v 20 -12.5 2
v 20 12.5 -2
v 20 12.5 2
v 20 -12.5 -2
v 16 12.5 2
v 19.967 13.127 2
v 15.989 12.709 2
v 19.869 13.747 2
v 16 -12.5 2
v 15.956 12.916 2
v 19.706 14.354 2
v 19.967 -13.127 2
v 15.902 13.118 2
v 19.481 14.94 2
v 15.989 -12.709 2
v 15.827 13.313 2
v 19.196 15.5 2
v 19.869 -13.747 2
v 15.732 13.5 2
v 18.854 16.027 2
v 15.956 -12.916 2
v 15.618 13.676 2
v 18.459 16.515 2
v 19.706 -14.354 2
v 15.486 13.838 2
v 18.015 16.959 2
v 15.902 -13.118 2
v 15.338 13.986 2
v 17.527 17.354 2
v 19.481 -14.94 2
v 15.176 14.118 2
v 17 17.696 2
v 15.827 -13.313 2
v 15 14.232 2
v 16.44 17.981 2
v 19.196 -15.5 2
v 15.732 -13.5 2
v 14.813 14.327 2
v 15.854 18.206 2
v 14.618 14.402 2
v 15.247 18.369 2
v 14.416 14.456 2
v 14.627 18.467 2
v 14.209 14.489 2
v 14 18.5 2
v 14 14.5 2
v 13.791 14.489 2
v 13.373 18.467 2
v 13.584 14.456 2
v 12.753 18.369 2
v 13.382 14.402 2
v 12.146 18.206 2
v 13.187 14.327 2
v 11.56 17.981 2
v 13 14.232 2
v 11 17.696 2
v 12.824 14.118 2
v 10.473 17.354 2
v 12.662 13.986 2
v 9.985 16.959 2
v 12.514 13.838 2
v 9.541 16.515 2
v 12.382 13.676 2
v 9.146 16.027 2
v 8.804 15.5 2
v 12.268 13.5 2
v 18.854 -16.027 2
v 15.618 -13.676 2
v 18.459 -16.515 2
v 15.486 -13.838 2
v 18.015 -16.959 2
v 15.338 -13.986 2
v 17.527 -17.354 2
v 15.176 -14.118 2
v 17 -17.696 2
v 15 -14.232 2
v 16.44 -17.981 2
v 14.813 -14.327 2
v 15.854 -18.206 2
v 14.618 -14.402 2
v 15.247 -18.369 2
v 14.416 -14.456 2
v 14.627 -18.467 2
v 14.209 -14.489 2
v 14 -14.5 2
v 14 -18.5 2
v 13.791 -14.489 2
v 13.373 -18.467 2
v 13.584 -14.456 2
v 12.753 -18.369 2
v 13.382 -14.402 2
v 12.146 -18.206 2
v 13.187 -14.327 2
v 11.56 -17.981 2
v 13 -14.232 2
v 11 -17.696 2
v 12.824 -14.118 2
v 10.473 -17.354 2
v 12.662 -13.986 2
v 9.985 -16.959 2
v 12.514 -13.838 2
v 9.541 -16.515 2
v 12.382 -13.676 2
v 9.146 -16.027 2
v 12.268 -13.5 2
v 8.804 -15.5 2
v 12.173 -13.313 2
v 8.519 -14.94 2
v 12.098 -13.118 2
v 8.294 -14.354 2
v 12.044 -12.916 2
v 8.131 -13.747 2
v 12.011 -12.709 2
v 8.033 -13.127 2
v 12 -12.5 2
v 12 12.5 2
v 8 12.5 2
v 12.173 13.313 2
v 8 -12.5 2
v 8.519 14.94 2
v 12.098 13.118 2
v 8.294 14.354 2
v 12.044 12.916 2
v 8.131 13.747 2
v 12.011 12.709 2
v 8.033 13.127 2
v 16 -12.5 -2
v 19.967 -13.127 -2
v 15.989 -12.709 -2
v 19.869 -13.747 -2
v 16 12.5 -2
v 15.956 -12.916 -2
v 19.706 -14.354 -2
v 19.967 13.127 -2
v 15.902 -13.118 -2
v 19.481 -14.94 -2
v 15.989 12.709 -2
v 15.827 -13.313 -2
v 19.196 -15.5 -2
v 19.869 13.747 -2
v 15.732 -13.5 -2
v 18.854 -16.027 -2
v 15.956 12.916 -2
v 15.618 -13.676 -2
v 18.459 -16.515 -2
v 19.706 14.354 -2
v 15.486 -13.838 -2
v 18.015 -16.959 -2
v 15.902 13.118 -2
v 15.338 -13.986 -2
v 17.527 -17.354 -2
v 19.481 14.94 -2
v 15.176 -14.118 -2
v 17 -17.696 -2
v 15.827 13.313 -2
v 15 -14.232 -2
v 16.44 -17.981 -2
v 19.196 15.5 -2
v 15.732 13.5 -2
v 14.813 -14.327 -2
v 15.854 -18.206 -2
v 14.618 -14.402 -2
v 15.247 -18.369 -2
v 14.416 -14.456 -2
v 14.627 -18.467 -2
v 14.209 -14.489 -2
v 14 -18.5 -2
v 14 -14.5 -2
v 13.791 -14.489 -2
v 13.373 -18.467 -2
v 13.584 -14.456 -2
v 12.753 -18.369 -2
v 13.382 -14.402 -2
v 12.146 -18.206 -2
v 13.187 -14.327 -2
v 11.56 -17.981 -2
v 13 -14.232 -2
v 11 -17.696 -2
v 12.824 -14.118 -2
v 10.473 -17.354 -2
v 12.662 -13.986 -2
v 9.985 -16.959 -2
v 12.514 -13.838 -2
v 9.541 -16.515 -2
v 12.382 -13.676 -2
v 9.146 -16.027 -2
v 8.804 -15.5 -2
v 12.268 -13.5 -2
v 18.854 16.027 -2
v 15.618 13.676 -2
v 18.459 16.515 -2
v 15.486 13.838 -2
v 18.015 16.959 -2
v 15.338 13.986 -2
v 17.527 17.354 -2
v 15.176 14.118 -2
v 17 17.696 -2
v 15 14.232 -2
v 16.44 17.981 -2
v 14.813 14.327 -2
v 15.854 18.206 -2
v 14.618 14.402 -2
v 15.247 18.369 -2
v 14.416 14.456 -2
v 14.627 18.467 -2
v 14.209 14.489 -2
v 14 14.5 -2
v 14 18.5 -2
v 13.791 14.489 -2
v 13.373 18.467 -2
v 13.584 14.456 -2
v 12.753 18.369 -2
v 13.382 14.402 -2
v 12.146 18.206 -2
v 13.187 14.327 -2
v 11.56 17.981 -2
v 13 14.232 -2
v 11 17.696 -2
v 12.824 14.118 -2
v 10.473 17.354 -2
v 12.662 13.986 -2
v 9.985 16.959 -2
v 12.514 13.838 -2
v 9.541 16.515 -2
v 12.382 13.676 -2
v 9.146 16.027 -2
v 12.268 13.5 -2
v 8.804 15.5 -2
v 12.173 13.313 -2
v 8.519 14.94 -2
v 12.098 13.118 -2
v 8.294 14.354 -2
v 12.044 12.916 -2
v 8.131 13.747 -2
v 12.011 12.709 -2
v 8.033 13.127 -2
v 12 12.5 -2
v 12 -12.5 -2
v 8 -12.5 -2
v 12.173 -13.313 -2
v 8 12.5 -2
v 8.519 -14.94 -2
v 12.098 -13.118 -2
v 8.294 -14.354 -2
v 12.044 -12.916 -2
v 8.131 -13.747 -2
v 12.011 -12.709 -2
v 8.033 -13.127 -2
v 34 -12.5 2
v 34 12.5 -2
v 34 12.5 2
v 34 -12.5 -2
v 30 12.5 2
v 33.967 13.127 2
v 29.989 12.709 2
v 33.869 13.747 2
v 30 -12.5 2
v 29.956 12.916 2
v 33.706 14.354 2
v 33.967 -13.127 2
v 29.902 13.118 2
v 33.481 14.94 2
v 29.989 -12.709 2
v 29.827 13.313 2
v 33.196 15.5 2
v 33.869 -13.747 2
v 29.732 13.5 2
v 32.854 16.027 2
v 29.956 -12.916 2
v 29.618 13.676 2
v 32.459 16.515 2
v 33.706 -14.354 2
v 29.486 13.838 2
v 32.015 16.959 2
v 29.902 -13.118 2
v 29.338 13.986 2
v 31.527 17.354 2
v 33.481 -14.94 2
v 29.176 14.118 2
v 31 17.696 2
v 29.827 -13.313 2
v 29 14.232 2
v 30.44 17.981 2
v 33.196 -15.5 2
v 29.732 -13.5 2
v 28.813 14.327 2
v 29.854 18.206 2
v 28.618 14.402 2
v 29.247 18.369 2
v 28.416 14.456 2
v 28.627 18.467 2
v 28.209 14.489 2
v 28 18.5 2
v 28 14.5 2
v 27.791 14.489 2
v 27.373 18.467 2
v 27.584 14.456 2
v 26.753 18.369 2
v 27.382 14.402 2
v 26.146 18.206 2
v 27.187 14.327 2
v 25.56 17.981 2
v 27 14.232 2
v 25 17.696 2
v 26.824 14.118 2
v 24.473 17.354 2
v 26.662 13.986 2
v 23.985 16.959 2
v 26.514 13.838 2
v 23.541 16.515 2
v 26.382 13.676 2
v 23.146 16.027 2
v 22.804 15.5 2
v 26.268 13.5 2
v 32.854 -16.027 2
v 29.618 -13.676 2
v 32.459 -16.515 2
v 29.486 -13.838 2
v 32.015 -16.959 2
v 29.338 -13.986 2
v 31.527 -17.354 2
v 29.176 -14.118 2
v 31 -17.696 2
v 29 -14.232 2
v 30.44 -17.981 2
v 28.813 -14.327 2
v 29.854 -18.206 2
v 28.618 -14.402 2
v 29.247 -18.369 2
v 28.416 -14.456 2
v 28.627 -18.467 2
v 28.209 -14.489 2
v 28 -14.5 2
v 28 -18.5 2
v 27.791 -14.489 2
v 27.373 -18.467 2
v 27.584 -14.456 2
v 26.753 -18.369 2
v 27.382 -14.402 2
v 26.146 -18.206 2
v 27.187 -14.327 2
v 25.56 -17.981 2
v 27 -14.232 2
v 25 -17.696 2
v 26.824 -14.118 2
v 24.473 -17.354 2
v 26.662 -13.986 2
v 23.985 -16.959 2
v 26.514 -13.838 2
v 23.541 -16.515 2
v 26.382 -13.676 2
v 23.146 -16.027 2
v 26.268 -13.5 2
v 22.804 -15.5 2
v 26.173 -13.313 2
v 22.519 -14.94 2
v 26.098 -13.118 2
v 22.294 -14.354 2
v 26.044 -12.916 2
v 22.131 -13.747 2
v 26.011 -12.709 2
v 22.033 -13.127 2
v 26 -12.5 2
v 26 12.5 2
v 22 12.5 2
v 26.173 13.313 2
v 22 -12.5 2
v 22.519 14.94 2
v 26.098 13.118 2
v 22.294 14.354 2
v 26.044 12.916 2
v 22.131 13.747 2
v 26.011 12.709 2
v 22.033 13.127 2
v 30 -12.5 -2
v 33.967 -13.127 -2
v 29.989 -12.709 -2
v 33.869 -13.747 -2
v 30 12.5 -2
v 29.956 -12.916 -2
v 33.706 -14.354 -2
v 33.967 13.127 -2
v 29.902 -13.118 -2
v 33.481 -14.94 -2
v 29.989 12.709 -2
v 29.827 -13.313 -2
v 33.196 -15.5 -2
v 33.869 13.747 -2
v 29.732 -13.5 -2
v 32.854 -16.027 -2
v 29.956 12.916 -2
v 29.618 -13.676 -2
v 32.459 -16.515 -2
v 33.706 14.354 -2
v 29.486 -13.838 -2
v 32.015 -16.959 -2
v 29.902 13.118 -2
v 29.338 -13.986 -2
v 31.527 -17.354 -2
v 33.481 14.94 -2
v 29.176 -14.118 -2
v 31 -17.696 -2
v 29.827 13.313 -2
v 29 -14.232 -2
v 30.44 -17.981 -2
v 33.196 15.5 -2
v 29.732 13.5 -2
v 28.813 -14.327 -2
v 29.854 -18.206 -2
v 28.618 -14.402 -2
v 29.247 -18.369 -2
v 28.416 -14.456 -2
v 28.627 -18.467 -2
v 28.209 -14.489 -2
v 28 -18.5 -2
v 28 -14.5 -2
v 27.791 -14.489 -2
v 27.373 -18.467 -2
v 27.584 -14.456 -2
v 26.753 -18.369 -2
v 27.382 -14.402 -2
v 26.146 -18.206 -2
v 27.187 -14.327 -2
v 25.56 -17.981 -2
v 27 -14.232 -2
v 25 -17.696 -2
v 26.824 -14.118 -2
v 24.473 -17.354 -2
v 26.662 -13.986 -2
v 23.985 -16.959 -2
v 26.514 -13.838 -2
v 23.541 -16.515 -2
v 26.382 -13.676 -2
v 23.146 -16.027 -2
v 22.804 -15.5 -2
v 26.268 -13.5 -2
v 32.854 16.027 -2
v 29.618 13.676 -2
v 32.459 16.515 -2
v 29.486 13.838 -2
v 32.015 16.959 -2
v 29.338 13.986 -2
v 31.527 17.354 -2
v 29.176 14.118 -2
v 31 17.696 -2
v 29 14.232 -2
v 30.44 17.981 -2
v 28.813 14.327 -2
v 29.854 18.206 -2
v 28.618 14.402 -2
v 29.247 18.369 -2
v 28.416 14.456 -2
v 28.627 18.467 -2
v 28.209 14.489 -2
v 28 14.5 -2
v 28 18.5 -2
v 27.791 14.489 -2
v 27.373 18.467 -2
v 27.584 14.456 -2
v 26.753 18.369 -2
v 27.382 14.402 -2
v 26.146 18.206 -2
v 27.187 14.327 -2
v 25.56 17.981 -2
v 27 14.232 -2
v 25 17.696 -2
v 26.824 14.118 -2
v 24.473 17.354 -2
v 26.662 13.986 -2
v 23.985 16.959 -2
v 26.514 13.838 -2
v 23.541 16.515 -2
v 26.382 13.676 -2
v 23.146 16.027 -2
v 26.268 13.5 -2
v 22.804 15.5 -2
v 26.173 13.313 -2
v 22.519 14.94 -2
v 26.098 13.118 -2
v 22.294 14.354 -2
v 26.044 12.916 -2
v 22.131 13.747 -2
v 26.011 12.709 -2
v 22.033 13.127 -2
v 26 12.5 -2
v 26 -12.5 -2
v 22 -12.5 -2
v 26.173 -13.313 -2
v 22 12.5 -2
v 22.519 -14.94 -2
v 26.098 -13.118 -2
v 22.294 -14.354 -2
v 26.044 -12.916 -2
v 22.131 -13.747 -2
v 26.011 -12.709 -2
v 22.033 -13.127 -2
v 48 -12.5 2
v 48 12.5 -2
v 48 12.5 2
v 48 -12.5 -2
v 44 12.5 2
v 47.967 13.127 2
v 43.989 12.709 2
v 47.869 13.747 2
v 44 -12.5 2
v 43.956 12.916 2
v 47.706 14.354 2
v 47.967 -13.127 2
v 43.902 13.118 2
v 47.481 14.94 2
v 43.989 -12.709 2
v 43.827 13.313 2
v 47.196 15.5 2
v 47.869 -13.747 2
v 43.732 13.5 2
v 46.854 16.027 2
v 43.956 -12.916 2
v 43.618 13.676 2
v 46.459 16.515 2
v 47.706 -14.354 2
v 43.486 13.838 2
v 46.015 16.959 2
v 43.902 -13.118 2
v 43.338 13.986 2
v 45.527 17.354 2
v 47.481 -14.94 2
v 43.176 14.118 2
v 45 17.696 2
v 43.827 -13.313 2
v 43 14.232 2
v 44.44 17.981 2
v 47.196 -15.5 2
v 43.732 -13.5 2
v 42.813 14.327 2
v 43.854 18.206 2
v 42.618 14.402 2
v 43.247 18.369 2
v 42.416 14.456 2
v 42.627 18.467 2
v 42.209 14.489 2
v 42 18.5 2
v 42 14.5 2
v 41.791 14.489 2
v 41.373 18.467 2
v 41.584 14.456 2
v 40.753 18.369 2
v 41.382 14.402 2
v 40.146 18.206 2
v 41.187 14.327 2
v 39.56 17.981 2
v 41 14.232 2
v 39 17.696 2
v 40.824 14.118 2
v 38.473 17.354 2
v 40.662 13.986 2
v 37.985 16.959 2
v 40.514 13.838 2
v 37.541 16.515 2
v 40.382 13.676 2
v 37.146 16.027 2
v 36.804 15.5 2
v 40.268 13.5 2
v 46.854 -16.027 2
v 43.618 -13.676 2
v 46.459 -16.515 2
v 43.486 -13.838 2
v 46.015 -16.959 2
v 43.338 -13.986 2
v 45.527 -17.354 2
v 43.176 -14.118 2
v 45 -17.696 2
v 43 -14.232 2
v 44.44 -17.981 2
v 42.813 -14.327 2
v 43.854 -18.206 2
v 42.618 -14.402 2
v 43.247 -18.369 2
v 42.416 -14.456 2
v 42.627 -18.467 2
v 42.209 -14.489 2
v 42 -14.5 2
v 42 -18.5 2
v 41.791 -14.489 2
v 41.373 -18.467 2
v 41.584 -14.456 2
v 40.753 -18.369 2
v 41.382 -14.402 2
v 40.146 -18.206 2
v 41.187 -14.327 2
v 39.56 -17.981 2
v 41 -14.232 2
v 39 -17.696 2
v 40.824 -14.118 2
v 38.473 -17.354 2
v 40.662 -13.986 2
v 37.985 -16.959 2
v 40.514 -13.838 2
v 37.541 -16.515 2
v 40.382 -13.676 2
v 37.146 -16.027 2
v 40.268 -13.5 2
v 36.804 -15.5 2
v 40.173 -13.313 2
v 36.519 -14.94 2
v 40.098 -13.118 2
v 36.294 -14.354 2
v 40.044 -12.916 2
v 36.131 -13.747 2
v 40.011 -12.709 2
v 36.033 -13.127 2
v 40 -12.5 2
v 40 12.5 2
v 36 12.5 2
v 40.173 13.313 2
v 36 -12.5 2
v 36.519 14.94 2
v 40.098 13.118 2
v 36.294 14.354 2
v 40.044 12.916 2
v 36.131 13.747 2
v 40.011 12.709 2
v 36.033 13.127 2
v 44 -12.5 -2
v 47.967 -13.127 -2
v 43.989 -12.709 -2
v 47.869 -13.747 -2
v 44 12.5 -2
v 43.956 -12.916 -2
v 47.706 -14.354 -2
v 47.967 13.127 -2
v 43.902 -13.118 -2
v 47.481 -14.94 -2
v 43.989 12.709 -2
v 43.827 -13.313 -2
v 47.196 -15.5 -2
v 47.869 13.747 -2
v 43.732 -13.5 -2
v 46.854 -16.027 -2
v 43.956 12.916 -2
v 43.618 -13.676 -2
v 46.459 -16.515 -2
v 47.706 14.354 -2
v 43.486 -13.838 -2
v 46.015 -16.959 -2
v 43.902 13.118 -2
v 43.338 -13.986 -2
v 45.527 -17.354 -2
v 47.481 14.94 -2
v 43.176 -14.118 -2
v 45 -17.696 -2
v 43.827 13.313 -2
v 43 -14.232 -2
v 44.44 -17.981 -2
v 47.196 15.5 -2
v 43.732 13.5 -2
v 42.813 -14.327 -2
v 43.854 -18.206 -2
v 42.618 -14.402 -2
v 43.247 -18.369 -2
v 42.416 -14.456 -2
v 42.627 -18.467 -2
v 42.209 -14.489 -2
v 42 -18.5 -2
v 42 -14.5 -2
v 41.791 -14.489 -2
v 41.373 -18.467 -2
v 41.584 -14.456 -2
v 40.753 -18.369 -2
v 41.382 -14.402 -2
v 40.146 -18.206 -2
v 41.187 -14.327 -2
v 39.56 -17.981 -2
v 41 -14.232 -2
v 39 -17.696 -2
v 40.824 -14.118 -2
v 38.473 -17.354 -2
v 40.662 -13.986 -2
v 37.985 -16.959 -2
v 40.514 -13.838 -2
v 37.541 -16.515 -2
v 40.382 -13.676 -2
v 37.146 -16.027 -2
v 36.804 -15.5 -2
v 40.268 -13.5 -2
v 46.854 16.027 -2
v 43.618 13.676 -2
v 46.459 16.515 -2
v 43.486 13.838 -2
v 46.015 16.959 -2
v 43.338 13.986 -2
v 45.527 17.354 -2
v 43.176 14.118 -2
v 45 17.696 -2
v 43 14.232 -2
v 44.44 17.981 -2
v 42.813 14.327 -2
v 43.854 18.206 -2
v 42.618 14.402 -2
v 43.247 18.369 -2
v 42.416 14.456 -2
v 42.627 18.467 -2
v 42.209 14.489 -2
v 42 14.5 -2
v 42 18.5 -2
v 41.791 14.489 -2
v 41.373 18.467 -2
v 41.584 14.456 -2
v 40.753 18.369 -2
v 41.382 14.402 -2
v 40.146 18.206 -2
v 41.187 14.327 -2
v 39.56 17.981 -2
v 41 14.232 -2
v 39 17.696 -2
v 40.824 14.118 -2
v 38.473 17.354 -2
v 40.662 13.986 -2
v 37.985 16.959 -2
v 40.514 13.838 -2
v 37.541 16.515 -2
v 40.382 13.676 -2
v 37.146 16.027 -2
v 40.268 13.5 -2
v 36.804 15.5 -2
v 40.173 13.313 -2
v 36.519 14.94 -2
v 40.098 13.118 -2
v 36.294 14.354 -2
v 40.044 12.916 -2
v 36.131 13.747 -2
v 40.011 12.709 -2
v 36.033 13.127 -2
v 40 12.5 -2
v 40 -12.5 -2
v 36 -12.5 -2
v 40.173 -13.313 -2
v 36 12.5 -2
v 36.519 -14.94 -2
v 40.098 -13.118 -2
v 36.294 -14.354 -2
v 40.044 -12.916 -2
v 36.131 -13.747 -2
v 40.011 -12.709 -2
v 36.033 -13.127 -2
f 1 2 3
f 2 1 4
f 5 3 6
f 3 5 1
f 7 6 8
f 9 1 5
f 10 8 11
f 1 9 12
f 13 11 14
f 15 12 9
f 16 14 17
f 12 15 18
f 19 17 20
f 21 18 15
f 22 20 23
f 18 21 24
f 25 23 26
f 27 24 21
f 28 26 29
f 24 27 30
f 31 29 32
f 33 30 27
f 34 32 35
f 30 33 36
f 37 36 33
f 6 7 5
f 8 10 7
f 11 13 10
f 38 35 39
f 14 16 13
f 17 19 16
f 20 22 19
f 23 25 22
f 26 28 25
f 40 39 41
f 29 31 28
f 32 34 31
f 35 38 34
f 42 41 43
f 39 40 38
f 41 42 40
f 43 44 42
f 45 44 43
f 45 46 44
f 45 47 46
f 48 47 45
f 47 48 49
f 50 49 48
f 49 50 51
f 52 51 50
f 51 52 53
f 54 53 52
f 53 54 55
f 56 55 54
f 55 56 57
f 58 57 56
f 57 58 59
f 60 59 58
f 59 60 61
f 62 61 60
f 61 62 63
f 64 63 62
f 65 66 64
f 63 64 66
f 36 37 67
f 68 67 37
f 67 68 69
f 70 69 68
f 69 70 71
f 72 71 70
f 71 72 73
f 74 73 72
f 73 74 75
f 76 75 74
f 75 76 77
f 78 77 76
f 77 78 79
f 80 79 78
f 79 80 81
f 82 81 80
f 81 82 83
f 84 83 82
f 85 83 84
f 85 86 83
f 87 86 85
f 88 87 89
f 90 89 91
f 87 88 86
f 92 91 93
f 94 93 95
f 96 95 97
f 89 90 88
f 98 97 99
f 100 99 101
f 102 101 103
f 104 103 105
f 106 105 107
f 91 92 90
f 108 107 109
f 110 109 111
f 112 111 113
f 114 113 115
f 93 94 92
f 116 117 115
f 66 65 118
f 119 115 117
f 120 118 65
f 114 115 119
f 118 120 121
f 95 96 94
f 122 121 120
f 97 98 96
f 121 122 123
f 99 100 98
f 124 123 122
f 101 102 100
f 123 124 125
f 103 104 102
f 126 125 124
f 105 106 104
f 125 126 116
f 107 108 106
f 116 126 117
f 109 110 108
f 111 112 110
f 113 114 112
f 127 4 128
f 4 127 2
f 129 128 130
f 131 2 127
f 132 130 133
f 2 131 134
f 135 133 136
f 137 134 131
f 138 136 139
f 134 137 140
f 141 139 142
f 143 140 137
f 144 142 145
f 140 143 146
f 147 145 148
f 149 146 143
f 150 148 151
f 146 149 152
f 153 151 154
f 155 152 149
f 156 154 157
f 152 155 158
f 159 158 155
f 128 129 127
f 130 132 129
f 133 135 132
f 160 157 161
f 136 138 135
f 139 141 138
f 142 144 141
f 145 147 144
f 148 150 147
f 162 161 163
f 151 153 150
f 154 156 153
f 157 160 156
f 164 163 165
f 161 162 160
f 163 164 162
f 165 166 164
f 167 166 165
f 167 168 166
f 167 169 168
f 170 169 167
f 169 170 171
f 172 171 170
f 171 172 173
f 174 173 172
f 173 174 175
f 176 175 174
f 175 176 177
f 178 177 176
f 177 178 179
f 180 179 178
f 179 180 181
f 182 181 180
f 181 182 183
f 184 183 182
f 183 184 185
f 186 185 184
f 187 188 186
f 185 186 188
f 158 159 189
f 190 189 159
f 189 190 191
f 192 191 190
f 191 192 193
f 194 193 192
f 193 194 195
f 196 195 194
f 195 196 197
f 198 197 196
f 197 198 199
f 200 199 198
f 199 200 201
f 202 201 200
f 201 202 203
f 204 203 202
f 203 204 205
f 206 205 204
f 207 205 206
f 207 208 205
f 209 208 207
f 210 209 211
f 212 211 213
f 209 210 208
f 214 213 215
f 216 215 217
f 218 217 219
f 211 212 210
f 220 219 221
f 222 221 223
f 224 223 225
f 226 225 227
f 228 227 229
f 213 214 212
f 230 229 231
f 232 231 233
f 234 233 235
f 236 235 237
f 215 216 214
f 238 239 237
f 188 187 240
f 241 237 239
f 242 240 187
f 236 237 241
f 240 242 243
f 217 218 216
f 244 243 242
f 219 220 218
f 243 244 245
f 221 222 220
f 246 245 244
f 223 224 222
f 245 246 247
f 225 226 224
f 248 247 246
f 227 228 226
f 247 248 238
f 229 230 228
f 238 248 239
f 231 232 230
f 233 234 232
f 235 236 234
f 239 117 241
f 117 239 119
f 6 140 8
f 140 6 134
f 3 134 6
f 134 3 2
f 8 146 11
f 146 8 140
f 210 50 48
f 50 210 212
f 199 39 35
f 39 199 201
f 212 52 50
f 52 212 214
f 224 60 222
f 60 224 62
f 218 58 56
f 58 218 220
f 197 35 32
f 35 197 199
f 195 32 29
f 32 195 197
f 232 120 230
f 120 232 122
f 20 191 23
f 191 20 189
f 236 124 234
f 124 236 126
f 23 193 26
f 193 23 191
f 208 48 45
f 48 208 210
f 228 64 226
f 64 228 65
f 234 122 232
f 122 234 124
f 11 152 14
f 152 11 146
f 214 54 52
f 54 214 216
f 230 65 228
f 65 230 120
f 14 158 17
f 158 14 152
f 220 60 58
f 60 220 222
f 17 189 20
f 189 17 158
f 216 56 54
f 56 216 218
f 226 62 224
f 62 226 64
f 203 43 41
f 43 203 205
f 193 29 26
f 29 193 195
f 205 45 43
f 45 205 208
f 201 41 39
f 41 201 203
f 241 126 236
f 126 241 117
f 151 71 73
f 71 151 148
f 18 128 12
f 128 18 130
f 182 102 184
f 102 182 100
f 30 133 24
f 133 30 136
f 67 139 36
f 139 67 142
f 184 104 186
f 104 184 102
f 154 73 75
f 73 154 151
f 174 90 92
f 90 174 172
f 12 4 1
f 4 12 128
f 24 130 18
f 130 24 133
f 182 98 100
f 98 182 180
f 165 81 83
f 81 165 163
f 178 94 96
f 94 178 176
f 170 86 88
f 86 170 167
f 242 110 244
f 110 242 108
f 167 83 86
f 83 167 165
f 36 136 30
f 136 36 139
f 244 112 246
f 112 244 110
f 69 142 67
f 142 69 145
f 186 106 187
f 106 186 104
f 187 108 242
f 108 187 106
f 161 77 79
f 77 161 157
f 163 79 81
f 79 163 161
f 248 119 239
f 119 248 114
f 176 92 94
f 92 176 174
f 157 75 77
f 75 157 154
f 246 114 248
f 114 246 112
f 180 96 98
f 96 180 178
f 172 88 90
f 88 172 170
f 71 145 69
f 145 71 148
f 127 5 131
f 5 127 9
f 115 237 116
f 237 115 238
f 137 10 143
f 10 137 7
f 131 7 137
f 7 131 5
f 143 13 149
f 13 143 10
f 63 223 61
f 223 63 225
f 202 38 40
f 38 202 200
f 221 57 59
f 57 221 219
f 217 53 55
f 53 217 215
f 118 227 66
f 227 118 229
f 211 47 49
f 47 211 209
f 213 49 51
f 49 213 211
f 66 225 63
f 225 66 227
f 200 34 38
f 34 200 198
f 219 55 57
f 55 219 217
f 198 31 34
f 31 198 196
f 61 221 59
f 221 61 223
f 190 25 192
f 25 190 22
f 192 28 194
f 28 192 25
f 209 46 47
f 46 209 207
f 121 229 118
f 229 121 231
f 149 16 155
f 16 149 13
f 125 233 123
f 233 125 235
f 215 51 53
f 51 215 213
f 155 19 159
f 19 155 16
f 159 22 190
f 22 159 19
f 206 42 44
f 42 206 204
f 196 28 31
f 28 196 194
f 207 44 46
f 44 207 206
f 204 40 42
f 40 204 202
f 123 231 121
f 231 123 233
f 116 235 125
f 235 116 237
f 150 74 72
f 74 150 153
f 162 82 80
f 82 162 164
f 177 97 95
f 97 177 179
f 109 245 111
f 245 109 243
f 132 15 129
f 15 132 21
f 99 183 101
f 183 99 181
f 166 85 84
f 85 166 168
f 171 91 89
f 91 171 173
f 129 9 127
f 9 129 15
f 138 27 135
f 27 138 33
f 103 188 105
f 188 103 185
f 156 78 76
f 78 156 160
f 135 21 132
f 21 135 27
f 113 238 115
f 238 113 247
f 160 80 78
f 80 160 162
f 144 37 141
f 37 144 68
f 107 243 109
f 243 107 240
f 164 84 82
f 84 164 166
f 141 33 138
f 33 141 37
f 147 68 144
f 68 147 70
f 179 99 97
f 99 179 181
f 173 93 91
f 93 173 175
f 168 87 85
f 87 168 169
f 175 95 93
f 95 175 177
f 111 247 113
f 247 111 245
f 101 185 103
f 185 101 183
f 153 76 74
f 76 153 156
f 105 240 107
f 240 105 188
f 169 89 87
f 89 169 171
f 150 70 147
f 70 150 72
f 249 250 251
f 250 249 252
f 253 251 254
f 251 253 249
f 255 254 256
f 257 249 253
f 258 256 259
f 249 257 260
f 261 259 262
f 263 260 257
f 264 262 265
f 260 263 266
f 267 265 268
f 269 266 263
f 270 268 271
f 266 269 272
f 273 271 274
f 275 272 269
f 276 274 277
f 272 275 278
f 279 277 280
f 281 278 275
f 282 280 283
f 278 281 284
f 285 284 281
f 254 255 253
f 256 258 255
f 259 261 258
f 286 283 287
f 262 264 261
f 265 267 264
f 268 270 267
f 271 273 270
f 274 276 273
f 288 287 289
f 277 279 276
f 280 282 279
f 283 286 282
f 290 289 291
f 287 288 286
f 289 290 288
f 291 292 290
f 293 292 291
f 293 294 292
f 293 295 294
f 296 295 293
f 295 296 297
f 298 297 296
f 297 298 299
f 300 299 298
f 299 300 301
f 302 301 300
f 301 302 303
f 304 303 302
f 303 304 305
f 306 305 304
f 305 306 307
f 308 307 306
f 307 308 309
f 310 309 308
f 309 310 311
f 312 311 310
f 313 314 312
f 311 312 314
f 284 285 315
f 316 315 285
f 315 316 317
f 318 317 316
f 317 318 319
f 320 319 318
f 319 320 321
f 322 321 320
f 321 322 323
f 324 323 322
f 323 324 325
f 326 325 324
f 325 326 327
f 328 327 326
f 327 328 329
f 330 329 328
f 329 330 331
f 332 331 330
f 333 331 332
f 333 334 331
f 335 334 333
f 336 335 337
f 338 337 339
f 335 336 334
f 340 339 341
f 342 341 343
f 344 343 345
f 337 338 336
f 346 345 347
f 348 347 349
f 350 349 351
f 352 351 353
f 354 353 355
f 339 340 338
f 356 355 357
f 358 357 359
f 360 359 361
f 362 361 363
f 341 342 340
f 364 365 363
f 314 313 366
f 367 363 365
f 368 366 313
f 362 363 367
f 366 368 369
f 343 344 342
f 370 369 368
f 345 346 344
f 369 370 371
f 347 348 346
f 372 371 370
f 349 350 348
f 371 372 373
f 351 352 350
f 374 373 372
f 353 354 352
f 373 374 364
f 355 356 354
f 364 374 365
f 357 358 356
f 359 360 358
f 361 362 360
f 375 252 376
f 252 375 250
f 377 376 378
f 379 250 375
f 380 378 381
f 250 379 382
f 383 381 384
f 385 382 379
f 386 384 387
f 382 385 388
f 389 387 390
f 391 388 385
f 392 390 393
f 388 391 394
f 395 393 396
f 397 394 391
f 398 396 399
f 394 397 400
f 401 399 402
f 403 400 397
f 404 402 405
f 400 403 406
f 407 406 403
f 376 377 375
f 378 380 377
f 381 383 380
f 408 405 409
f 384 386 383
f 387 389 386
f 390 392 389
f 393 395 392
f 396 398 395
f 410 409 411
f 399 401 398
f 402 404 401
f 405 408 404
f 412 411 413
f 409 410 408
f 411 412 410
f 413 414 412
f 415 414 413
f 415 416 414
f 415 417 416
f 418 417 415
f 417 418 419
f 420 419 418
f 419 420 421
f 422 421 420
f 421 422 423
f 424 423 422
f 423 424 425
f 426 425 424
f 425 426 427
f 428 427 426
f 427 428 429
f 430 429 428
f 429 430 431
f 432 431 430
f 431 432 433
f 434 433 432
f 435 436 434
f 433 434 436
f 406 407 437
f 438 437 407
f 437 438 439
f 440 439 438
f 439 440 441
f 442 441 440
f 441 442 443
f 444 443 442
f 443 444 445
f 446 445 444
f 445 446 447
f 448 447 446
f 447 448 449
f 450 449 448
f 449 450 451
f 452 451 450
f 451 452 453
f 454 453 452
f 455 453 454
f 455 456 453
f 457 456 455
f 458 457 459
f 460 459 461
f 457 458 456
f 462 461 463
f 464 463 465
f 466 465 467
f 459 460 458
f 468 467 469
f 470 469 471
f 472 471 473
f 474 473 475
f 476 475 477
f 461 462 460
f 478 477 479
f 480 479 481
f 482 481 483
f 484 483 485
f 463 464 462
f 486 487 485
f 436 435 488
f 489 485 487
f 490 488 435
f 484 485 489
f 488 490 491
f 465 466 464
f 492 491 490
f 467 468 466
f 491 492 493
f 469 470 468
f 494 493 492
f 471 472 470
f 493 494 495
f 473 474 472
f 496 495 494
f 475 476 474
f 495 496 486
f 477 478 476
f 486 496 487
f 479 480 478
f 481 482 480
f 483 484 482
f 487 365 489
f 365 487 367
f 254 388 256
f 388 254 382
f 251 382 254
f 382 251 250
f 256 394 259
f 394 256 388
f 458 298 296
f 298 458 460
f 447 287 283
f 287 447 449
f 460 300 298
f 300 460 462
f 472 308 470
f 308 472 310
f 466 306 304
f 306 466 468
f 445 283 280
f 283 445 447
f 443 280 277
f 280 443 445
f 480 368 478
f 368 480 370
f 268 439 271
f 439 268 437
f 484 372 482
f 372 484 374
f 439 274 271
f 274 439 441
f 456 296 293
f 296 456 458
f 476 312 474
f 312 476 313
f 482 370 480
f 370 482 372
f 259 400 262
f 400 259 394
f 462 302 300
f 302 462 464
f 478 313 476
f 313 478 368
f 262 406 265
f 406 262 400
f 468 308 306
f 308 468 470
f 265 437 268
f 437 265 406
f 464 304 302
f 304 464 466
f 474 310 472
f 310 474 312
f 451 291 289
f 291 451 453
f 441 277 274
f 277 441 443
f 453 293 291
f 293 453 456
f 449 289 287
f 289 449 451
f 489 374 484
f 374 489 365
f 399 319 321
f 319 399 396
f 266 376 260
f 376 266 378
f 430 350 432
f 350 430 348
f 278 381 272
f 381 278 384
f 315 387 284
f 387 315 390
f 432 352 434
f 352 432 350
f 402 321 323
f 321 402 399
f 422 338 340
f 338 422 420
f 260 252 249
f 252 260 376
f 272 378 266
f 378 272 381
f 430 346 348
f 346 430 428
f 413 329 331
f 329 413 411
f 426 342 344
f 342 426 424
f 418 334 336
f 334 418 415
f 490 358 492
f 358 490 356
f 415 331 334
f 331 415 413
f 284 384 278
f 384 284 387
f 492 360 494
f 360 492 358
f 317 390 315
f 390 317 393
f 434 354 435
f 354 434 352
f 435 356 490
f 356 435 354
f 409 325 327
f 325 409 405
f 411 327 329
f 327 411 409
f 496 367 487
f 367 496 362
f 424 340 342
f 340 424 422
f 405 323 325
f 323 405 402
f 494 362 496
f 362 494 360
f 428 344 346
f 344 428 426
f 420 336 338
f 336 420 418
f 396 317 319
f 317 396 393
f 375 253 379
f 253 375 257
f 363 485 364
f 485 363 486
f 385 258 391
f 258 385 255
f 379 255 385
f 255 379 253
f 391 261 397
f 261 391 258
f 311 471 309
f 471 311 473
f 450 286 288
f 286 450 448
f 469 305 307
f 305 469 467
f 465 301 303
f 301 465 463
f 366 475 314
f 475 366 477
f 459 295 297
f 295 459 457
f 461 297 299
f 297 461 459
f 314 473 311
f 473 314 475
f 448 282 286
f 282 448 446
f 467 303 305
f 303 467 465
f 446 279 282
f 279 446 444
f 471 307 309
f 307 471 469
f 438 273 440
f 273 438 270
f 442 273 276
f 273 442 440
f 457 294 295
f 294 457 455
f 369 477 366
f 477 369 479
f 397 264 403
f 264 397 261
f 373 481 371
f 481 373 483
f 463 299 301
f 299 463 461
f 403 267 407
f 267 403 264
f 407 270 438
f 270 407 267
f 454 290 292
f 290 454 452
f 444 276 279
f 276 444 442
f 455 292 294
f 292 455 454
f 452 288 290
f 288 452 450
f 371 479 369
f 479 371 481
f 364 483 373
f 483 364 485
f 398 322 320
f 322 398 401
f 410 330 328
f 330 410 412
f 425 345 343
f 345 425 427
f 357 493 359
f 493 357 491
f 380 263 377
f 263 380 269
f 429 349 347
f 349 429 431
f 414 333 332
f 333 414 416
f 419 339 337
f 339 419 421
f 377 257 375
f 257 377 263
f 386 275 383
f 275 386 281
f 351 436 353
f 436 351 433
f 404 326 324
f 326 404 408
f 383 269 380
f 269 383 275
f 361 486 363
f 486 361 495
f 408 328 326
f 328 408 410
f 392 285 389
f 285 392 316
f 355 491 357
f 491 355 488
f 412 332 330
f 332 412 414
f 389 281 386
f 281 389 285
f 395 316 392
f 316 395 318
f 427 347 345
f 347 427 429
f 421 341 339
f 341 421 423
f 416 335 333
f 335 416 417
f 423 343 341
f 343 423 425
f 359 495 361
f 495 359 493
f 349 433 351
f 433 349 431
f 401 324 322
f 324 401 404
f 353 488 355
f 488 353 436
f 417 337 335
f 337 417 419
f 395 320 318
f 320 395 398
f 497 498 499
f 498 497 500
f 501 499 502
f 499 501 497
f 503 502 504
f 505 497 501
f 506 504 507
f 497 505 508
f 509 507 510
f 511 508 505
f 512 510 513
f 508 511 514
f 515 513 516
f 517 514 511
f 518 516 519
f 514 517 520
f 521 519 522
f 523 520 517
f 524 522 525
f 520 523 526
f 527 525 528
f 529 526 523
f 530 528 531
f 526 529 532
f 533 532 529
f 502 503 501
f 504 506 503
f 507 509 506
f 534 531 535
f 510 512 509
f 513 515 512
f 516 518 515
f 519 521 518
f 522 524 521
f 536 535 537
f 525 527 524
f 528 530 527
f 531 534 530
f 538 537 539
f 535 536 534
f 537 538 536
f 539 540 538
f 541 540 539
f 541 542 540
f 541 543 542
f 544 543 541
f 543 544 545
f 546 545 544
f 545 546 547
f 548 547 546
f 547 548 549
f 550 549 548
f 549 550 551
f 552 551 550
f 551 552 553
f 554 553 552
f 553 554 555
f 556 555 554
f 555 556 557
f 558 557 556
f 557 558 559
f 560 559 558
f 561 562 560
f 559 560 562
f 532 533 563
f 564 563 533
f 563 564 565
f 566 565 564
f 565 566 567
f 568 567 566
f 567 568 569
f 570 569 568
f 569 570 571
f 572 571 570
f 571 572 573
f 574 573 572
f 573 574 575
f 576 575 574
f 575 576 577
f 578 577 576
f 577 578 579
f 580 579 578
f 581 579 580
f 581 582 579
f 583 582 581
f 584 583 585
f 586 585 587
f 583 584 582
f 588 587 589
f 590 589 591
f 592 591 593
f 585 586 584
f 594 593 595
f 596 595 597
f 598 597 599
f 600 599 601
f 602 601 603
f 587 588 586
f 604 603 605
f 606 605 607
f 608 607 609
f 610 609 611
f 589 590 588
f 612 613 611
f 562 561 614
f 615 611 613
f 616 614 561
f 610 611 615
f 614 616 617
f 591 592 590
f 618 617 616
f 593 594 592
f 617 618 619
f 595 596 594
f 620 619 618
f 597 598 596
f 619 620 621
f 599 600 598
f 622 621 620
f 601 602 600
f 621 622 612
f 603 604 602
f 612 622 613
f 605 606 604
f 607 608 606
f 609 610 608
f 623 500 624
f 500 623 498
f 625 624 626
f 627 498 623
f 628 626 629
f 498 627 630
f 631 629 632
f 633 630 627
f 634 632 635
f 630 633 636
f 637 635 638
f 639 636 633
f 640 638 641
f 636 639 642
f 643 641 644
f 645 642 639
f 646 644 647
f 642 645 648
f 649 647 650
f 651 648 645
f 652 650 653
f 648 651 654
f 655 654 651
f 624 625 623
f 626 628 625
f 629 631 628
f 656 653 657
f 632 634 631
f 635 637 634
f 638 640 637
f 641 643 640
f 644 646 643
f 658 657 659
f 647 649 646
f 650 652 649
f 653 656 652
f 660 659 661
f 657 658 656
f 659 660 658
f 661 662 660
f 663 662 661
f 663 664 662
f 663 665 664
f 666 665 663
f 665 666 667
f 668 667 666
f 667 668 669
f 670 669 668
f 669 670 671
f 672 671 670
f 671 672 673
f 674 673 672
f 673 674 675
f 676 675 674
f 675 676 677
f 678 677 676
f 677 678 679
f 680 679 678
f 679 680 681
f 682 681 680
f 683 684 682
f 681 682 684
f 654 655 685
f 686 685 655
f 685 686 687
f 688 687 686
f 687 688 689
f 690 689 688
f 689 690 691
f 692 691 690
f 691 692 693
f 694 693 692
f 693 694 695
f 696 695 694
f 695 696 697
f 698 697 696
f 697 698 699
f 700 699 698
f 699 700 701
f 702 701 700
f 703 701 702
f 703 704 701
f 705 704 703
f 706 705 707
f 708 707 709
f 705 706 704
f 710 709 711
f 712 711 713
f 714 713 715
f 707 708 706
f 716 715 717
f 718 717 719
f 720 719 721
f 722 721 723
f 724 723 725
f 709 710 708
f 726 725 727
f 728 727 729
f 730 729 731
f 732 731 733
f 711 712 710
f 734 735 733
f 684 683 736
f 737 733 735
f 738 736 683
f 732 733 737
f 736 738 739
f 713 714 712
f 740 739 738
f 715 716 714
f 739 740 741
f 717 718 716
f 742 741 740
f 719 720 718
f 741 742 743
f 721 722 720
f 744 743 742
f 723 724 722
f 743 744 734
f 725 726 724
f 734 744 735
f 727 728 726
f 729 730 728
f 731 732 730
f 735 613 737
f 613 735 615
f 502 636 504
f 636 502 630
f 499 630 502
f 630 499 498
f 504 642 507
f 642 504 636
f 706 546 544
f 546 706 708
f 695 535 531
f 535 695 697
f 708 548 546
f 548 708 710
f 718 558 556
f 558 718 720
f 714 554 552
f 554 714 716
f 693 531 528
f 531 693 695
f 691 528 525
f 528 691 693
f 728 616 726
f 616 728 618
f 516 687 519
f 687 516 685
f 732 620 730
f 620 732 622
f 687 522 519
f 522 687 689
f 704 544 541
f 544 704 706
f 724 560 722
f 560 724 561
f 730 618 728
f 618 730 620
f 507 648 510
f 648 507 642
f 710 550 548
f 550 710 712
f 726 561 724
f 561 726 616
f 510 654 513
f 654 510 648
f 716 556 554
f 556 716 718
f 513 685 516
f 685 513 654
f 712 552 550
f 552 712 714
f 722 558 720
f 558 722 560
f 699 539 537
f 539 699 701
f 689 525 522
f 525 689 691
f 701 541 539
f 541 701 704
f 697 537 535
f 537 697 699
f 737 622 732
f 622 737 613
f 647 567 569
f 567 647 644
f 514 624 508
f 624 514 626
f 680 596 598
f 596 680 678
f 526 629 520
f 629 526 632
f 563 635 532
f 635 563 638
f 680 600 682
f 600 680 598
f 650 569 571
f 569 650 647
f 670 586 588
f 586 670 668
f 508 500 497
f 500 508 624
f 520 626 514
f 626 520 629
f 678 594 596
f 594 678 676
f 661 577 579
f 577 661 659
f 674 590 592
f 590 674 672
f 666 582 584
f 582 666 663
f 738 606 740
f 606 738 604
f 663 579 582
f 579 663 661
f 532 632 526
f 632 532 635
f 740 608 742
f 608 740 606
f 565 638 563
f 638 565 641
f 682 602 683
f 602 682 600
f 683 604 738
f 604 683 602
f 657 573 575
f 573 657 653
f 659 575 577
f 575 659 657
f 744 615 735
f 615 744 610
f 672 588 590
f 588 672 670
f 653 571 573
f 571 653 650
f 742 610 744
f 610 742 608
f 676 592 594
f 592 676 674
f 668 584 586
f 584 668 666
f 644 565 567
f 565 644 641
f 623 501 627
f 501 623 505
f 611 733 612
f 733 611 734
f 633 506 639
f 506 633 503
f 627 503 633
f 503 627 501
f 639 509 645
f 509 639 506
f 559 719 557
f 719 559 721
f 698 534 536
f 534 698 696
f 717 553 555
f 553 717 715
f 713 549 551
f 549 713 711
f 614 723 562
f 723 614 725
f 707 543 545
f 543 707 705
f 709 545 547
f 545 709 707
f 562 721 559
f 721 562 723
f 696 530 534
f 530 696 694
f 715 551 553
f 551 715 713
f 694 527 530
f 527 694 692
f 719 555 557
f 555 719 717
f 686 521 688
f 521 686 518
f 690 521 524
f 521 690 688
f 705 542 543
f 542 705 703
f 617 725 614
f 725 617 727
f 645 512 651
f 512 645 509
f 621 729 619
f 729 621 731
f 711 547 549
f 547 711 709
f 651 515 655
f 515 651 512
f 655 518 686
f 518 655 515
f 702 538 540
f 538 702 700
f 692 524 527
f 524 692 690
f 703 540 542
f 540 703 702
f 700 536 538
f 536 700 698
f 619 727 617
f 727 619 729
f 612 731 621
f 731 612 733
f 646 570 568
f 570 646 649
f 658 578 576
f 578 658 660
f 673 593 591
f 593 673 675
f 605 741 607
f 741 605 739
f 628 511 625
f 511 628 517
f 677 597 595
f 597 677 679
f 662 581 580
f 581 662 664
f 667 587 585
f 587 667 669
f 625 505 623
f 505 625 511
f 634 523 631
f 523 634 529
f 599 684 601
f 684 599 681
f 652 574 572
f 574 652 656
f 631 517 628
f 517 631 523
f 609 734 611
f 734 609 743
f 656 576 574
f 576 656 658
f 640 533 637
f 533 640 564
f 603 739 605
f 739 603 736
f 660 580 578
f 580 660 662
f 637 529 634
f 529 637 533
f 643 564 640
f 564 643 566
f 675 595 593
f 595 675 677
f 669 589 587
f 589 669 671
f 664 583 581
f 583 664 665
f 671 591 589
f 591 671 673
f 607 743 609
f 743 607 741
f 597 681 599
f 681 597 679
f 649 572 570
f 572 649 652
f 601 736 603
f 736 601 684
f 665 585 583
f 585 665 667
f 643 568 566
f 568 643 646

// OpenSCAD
/* Open SCAD Name.:Weak link
*
*  Creation Date..: 21/06/2021
*  Discription....: PLA weak link
*  Author.........: fred
*
*  Version 1, 21/06/2021 : initial 

*  This program is free software; you can redistribute it and/or modify
*  it under the terms of the GNU General Public License as published by
*  the Free Software Foundation; either version 3 of the License, or
*  (at your option) any later version.
*
*  This program is distributed in the hope that it will be useful,
*  but WITHOUT ANY WARRANTY; without even the implied warranty of
*  MERCHANTABILITY or FITNESS FOR A PARTICULAR PURPOSE.  See the
*  GNU General Public License for more details.
*/ 

/*------------------Customizer View-------------------*/
// preview[view:north, tilt:top]


/*---------------------Parameters---------------------*/
// Parameters in the execute section
//
nb_weak_link = 3 ;
distance_object_mm = 2 ;


internal_gap_mm = 4;
length_mm = 25;
height_mm = 4 ;
wall_thickness_mm = 4;

/*-----------------------Execute----------------------*/
echo("Weak link section ",wall_thickness_mm * height_mm* 2, "mm2");
distance_mm = internal_gap_mm + ( 2* wall_thickness_mm) + distance_object_mm;

linear_array( occurance=nb_weak_link, distance=distance_mm)  weak_link( internal_gap_mm , length_mm , height_mm , wall_thickness_mm );

/*-----------------------Modules----------------------*/

module linear_array( occurance, distance ) {
    for ( i= [1:1:occurance])  {
        translate([distance*i,0,0,]) 
        children();
    }
}

module weak_link( internal_gap , length , height , wall ){

    dia=internal_gap +( 2* wall);
    center = true;
        
    difference() {
            
            union() {
                //create base oblong structure
                cube([dia,length,height], center);
                translate ([0,length/2,0]) {cylinder(height,dia/2,dia/2,$fn=60, center);
                }
                translate ([0,-length/2,0]) {cylinder(height,dia/2,dia/2,$fn=60, center);
                }
            } //end union
            
            union() {
                //create base oblong structure
                cube([dia-(wall*2),length,height+1], center);
                translate ([0,length/2,0]) {cylinder(height+1,dia/2-wall,dia/2-wall,$fn=60, center);
                }
                translate ([0,-length/2,0]) {cylinder(height+1,dia/2-wall,dia/2-wall,$fn=60, center);
                }
            } //end union
        } //end differance


    } //End module

/*----------------------End Code----------------------*/
